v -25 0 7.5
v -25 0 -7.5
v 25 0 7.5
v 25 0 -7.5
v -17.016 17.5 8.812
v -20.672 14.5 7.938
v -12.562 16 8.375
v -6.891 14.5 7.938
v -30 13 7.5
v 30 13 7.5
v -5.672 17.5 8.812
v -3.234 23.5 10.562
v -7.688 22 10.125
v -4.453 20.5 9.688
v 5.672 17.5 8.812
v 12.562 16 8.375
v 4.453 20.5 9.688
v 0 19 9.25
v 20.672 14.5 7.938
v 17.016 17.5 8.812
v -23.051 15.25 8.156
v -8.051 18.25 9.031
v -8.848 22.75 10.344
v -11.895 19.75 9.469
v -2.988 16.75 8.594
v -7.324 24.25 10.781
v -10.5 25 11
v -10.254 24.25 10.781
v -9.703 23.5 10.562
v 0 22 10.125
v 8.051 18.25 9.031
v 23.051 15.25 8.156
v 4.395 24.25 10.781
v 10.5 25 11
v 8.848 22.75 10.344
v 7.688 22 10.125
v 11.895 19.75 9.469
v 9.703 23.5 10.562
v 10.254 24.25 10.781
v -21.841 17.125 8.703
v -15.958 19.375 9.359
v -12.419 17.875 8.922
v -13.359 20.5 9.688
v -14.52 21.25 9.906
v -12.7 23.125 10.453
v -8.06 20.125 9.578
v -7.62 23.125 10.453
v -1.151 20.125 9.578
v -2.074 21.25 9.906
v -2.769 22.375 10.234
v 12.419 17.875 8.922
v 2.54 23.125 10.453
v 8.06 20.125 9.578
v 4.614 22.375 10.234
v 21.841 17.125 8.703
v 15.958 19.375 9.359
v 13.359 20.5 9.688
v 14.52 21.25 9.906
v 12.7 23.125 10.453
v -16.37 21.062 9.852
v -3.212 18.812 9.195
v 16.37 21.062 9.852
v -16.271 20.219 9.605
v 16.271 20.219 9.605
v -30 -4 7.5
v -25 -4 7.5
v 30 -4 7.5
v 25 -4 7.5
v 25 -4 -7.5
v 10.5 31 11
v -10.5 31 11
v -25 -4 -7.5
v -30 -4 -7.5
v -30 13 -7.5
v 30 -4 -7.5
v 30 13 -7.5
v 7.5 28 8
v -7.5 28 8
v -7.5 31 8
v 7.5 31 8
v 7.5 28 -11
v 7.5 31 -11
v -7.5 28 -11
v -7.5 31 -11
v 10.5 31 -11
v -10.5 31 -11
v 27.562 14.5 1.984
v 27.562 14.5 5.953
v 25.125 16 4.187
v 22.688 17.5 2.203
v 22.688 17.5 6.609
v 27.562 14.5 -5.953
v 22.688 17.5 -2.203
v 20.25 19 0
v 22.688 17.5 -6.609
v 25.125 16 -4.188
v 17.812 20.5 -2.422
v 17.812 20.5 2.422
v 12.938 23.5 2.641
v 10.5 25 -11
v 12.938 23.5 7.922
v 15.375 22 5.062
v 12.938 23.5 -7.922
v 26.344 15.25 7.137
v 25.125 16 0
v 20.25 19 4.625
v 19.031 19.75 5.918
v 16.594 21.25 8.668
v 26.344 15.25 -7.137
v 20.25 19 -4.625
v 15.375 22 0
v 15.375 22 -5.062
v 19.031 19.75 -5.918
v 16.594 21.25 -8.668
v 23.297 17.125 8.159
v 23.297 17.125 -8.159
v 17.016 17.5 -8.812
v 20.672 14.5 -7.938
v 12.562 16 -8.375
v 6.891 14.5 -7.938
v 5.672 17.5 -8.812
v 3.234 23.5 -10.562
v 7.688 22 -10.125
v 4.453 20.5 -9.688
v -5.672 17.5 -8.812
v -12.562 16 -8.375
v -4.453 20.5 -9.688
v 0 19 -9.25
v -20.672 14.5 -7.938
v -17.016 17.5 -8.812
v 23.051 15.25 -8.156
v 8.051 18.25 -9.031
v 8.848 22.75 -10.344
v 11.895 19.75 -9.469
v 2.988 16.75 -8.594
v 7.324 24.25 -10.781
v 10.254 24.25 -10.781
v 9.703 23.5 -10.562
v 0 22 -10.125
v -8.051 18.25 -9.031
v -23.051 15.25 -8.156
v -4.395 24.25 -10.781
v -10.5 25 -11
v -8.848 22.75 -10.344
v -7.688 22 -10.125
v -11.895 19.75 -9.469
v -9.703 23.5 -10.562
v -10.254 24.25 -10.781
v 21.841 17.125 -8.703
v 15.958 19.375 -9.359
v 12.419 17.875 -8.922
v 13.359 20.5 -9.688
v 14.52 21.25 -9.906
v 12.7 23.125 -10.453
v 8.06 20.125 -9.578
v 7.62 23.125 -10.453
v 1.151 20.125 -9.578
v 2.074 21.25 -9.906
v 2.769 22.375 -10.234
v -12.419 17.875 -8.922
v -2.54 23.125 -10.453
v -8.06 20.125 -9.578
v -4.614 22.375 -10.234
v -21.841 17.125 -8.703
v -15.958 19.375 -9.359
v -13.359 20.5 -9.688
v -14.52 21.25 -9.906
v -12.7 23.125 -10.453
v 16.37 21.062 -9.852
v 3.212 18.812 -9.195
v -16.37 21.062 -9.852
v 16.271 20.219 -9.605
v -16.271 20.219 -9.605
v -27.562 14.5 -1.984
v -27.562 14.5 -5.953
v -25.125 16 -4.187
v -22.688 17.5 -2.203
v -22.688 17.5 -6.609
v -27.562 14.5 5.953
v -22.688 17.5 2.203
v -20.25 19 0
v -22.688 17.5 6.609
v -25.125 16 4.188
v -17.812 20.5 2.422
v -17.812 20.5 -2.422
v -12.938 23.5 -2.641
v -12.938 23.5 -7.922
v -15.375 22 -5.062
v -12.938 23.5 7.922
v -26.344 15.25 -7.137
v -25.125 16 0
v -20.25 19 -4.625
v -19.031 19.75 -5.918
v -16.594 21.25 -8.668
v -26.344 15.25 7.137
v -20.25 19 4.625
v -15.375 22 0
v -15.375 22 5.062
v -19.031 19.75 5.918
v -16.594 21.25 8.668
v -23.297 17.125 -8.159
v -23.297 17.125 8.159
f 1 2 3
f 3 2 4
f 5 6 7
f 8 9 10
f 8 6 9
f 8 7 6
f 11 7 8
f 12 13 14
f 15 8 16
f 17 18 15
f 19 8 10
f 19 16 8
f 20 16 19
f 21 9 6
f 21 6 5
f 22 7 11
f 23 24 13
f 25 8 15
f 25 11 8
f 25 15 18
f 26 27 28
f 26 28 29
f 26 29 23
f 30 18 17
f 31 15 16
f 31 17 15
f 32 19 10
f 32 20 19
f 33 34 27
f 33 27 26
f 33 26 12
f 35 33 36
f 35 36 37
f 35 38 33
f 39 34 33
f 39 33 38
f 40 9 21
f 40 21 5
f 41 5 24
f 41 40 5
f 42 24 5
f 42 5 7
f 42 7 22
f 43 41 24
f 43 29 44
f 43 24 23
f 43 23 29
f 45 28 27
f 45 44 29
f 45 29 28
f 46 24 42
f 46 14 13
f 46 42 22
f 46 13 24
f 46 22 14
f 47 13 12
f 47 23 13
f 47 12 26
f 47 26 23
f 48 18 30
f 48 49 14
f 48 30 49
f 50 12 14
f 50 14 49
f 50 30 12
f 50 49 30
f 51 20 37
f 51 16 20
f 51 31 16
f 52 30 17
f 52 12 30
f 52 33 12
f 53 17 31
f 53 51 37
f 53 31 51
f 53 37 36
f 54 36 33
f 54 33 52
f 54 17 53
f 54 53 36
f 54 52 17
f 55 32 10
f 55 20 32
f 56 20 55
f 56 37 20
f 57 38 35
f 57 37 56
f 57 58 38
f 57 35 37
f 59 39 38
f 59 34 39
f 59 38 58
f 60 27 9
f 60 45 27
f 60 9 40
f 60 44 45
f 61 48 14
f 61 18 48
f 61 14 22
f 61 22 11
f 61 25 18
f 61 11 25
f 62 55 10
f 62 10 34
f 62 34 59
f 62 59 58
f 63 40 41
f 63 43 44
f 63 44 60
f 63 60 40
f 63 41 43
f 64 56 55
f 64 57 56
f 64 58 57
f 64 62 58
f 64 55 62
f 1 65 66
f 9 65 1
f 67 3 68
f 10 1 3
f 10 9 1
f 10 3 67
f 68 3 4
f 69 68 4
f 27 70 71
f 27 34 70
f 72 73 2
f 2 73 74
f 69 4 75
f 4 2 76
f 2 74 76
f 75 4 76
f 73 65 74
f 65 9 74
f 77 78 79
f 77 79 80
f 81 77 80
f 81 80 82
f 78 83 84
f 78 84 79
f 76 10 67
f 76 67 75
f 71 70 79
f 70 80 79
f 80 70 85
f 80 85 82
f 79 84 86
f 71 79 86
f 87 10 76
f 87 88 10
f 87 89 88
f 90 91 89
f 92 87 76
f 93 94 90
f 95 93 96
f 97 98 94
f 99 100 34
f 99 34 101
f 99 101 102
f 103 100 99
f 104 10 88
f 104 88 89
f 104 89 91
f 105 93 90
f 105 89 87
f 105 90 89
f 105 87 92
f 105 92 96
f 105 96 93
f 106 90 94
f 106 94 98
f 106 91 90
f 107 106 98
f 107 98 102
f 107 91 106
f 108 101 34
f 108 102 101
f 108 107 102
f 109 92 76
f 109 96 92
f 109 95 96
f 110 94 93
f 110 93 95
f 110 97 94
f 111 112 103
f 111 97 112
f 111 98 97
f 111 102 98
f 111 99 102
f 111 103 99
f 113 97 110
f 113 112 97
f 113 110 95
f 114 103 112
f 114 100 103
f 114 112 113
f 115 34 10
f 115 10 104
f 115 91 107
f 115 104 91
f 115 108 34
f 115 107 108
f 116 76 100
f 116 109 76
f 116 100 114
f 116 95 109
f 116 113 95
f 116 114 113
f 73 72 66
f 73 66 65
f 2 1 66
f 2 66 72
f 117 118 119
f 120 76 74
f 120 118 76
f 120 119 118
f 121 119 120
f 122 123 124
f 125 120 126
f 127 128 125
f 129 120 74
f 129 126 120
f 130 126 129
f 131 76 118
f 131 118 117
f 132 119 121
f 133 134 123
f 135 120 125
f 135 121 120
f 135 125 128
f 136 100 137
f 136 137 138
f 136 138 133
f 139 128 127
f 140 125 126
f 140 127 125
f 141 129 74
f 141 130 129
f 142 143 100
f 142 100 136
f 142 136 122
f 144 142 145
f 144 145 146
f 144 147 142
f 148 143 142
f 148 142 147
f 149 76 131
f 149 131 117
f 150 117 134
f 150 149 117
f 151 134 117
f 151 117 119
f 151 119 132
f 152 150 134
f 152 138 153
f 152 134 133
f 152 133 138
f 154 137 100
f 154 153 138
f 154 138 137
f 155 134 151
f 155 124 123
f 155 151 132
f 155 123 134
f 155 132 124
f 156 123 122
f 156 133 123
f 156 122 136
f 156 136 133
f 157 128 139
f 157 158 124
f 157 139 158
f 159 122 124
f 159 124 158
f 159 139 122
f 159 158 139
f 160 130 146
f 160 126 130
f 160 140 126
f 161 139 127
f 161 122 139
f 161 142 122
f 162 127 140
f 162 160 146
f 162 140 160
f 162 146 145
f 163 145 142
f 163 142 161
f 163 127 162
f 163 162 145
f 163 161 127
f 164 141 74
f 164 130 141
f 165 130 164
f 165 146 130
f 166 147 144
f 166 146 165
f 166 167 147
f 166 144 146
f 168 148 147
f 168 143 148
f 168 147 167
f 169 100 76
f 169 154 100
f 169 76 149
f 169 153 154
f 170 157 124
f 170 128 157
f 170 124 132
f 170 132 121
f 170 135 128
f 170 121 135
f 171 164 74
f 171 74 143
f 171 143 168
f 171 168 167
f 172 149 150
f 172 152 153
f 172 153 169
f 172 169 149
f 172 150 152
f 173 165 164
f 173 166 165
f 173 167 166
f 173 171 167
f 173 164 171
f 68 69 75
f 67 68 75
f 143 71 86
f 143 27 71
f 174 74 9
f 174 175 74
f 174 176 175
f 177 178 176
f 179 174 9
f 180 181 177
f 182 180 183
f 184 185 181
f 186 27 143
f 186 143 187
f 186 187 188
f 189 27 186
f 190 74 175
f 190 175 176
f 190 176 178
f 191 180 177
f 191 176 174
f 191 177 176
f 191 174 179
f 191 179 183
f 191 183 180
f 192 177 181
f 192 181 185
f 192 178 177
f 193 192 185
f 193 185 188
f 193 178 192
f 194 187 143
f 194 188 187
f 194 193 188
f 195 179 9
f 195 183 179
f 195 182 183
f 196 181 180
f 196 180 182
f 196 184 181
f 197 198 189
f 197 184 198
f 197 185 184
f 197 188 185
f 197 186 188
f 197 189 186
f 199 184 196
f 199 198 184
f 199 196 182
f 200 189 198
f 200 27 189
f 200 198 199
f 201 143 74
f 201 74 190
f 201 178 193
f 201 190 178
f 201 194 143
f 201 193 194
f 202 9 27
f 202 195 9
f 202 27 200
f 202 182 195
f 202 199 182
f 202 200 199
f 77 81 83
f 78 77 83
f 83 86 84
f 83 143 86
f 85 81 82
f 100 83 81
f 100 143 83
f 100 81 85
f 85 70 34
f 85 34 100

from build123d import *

# Parameters (mm, degrees)
SKETCH1_W           = 60
SKETCH1_H           = 15
BOSS_EXTRUDE1_DEPTH = 13
SKETCH4_W           = 5
SKETCH4_H           = 15
BOSS_EXTRUDE2_DEPTH = 4
SKETCH5_W           = 21
SKETCH5_H           = 22
BOSS_EXTRUDE3_DEPTH = 3
BOSS_EXTRUDE4_DEPTH = 3


with BuildPart() as part:
    # Sketch1 → Boss-Extrude1 (new body)
    with BuildSketch(Plane(origin=(0, 0, 0), x_dir=(1, 0, 0), z_dir=(0, 1, 0))):
        Rectangle(SKETCH1_W, SKETCH1_H)
    extrude(amount=BOSS_EXTRUDE1_DEPTH)

    # Sketch4 → Boss-Extrude2 (add)
    with BuildSketch(Plane(origin=(0, 0, 0), x_dir=(-1, 0, 0), z_dir=(0, -1, 0))):
        with Locations((27.5, 0)):
            Rectangle(SKETCH4_W, SKETCH4_H)
    boss_extrude2 = extrude(amount=BOSS_EXTRUDE2_DEPTH)

    # Mirror1: Boss-Extrude2 across plane
    add(boss_extrude2.mirror(Plane(origin=(0, 0, 0), x_dir=(0, 0, 1), z_dir=(1, 0, 0))))



with BuildPart() as body_2:
    # Sketch5 → Boss-Extrude3 (new body)
    with BuildSketch(Plane(origin=(0, 28, 0), x_dir=(-1, 0, 0), z_dir=(0, -1, 0))):
        Rectangle(SKETCH5_W, SKETCH5_H)
    extrude(amount=BOSS_EXTRUDE3_DEPTH)


with BuildPart() as part_1:
    add(part.part)

    add(body_2.part)  # loft1 joins it to this body
    # loft from a face of the part (loft1)
    loft([part_1.faces().sort_by_distance((0, 13, 0))[0], part_1.faces().sort_by_distance((0, 25, 0))[0]])

    # Sketch7 → Boss-Extrude4 (add)
    with BuildSketch(Plane(origin=(0, 28, 0), x_dir=(-1, 0, 0), z_dir=(0, -1, 0))):
        Polygon((10.5, 11), (7.5, 11), (7.5, -8), (-7.5, -8), (-7.5, 11), (-10.5, 11), (-10.5, -11), (10.5, -11), align=None)
    extrude(amount=-BOSS_EXTRUDE4_DEPTH)


solid = part_1.part
